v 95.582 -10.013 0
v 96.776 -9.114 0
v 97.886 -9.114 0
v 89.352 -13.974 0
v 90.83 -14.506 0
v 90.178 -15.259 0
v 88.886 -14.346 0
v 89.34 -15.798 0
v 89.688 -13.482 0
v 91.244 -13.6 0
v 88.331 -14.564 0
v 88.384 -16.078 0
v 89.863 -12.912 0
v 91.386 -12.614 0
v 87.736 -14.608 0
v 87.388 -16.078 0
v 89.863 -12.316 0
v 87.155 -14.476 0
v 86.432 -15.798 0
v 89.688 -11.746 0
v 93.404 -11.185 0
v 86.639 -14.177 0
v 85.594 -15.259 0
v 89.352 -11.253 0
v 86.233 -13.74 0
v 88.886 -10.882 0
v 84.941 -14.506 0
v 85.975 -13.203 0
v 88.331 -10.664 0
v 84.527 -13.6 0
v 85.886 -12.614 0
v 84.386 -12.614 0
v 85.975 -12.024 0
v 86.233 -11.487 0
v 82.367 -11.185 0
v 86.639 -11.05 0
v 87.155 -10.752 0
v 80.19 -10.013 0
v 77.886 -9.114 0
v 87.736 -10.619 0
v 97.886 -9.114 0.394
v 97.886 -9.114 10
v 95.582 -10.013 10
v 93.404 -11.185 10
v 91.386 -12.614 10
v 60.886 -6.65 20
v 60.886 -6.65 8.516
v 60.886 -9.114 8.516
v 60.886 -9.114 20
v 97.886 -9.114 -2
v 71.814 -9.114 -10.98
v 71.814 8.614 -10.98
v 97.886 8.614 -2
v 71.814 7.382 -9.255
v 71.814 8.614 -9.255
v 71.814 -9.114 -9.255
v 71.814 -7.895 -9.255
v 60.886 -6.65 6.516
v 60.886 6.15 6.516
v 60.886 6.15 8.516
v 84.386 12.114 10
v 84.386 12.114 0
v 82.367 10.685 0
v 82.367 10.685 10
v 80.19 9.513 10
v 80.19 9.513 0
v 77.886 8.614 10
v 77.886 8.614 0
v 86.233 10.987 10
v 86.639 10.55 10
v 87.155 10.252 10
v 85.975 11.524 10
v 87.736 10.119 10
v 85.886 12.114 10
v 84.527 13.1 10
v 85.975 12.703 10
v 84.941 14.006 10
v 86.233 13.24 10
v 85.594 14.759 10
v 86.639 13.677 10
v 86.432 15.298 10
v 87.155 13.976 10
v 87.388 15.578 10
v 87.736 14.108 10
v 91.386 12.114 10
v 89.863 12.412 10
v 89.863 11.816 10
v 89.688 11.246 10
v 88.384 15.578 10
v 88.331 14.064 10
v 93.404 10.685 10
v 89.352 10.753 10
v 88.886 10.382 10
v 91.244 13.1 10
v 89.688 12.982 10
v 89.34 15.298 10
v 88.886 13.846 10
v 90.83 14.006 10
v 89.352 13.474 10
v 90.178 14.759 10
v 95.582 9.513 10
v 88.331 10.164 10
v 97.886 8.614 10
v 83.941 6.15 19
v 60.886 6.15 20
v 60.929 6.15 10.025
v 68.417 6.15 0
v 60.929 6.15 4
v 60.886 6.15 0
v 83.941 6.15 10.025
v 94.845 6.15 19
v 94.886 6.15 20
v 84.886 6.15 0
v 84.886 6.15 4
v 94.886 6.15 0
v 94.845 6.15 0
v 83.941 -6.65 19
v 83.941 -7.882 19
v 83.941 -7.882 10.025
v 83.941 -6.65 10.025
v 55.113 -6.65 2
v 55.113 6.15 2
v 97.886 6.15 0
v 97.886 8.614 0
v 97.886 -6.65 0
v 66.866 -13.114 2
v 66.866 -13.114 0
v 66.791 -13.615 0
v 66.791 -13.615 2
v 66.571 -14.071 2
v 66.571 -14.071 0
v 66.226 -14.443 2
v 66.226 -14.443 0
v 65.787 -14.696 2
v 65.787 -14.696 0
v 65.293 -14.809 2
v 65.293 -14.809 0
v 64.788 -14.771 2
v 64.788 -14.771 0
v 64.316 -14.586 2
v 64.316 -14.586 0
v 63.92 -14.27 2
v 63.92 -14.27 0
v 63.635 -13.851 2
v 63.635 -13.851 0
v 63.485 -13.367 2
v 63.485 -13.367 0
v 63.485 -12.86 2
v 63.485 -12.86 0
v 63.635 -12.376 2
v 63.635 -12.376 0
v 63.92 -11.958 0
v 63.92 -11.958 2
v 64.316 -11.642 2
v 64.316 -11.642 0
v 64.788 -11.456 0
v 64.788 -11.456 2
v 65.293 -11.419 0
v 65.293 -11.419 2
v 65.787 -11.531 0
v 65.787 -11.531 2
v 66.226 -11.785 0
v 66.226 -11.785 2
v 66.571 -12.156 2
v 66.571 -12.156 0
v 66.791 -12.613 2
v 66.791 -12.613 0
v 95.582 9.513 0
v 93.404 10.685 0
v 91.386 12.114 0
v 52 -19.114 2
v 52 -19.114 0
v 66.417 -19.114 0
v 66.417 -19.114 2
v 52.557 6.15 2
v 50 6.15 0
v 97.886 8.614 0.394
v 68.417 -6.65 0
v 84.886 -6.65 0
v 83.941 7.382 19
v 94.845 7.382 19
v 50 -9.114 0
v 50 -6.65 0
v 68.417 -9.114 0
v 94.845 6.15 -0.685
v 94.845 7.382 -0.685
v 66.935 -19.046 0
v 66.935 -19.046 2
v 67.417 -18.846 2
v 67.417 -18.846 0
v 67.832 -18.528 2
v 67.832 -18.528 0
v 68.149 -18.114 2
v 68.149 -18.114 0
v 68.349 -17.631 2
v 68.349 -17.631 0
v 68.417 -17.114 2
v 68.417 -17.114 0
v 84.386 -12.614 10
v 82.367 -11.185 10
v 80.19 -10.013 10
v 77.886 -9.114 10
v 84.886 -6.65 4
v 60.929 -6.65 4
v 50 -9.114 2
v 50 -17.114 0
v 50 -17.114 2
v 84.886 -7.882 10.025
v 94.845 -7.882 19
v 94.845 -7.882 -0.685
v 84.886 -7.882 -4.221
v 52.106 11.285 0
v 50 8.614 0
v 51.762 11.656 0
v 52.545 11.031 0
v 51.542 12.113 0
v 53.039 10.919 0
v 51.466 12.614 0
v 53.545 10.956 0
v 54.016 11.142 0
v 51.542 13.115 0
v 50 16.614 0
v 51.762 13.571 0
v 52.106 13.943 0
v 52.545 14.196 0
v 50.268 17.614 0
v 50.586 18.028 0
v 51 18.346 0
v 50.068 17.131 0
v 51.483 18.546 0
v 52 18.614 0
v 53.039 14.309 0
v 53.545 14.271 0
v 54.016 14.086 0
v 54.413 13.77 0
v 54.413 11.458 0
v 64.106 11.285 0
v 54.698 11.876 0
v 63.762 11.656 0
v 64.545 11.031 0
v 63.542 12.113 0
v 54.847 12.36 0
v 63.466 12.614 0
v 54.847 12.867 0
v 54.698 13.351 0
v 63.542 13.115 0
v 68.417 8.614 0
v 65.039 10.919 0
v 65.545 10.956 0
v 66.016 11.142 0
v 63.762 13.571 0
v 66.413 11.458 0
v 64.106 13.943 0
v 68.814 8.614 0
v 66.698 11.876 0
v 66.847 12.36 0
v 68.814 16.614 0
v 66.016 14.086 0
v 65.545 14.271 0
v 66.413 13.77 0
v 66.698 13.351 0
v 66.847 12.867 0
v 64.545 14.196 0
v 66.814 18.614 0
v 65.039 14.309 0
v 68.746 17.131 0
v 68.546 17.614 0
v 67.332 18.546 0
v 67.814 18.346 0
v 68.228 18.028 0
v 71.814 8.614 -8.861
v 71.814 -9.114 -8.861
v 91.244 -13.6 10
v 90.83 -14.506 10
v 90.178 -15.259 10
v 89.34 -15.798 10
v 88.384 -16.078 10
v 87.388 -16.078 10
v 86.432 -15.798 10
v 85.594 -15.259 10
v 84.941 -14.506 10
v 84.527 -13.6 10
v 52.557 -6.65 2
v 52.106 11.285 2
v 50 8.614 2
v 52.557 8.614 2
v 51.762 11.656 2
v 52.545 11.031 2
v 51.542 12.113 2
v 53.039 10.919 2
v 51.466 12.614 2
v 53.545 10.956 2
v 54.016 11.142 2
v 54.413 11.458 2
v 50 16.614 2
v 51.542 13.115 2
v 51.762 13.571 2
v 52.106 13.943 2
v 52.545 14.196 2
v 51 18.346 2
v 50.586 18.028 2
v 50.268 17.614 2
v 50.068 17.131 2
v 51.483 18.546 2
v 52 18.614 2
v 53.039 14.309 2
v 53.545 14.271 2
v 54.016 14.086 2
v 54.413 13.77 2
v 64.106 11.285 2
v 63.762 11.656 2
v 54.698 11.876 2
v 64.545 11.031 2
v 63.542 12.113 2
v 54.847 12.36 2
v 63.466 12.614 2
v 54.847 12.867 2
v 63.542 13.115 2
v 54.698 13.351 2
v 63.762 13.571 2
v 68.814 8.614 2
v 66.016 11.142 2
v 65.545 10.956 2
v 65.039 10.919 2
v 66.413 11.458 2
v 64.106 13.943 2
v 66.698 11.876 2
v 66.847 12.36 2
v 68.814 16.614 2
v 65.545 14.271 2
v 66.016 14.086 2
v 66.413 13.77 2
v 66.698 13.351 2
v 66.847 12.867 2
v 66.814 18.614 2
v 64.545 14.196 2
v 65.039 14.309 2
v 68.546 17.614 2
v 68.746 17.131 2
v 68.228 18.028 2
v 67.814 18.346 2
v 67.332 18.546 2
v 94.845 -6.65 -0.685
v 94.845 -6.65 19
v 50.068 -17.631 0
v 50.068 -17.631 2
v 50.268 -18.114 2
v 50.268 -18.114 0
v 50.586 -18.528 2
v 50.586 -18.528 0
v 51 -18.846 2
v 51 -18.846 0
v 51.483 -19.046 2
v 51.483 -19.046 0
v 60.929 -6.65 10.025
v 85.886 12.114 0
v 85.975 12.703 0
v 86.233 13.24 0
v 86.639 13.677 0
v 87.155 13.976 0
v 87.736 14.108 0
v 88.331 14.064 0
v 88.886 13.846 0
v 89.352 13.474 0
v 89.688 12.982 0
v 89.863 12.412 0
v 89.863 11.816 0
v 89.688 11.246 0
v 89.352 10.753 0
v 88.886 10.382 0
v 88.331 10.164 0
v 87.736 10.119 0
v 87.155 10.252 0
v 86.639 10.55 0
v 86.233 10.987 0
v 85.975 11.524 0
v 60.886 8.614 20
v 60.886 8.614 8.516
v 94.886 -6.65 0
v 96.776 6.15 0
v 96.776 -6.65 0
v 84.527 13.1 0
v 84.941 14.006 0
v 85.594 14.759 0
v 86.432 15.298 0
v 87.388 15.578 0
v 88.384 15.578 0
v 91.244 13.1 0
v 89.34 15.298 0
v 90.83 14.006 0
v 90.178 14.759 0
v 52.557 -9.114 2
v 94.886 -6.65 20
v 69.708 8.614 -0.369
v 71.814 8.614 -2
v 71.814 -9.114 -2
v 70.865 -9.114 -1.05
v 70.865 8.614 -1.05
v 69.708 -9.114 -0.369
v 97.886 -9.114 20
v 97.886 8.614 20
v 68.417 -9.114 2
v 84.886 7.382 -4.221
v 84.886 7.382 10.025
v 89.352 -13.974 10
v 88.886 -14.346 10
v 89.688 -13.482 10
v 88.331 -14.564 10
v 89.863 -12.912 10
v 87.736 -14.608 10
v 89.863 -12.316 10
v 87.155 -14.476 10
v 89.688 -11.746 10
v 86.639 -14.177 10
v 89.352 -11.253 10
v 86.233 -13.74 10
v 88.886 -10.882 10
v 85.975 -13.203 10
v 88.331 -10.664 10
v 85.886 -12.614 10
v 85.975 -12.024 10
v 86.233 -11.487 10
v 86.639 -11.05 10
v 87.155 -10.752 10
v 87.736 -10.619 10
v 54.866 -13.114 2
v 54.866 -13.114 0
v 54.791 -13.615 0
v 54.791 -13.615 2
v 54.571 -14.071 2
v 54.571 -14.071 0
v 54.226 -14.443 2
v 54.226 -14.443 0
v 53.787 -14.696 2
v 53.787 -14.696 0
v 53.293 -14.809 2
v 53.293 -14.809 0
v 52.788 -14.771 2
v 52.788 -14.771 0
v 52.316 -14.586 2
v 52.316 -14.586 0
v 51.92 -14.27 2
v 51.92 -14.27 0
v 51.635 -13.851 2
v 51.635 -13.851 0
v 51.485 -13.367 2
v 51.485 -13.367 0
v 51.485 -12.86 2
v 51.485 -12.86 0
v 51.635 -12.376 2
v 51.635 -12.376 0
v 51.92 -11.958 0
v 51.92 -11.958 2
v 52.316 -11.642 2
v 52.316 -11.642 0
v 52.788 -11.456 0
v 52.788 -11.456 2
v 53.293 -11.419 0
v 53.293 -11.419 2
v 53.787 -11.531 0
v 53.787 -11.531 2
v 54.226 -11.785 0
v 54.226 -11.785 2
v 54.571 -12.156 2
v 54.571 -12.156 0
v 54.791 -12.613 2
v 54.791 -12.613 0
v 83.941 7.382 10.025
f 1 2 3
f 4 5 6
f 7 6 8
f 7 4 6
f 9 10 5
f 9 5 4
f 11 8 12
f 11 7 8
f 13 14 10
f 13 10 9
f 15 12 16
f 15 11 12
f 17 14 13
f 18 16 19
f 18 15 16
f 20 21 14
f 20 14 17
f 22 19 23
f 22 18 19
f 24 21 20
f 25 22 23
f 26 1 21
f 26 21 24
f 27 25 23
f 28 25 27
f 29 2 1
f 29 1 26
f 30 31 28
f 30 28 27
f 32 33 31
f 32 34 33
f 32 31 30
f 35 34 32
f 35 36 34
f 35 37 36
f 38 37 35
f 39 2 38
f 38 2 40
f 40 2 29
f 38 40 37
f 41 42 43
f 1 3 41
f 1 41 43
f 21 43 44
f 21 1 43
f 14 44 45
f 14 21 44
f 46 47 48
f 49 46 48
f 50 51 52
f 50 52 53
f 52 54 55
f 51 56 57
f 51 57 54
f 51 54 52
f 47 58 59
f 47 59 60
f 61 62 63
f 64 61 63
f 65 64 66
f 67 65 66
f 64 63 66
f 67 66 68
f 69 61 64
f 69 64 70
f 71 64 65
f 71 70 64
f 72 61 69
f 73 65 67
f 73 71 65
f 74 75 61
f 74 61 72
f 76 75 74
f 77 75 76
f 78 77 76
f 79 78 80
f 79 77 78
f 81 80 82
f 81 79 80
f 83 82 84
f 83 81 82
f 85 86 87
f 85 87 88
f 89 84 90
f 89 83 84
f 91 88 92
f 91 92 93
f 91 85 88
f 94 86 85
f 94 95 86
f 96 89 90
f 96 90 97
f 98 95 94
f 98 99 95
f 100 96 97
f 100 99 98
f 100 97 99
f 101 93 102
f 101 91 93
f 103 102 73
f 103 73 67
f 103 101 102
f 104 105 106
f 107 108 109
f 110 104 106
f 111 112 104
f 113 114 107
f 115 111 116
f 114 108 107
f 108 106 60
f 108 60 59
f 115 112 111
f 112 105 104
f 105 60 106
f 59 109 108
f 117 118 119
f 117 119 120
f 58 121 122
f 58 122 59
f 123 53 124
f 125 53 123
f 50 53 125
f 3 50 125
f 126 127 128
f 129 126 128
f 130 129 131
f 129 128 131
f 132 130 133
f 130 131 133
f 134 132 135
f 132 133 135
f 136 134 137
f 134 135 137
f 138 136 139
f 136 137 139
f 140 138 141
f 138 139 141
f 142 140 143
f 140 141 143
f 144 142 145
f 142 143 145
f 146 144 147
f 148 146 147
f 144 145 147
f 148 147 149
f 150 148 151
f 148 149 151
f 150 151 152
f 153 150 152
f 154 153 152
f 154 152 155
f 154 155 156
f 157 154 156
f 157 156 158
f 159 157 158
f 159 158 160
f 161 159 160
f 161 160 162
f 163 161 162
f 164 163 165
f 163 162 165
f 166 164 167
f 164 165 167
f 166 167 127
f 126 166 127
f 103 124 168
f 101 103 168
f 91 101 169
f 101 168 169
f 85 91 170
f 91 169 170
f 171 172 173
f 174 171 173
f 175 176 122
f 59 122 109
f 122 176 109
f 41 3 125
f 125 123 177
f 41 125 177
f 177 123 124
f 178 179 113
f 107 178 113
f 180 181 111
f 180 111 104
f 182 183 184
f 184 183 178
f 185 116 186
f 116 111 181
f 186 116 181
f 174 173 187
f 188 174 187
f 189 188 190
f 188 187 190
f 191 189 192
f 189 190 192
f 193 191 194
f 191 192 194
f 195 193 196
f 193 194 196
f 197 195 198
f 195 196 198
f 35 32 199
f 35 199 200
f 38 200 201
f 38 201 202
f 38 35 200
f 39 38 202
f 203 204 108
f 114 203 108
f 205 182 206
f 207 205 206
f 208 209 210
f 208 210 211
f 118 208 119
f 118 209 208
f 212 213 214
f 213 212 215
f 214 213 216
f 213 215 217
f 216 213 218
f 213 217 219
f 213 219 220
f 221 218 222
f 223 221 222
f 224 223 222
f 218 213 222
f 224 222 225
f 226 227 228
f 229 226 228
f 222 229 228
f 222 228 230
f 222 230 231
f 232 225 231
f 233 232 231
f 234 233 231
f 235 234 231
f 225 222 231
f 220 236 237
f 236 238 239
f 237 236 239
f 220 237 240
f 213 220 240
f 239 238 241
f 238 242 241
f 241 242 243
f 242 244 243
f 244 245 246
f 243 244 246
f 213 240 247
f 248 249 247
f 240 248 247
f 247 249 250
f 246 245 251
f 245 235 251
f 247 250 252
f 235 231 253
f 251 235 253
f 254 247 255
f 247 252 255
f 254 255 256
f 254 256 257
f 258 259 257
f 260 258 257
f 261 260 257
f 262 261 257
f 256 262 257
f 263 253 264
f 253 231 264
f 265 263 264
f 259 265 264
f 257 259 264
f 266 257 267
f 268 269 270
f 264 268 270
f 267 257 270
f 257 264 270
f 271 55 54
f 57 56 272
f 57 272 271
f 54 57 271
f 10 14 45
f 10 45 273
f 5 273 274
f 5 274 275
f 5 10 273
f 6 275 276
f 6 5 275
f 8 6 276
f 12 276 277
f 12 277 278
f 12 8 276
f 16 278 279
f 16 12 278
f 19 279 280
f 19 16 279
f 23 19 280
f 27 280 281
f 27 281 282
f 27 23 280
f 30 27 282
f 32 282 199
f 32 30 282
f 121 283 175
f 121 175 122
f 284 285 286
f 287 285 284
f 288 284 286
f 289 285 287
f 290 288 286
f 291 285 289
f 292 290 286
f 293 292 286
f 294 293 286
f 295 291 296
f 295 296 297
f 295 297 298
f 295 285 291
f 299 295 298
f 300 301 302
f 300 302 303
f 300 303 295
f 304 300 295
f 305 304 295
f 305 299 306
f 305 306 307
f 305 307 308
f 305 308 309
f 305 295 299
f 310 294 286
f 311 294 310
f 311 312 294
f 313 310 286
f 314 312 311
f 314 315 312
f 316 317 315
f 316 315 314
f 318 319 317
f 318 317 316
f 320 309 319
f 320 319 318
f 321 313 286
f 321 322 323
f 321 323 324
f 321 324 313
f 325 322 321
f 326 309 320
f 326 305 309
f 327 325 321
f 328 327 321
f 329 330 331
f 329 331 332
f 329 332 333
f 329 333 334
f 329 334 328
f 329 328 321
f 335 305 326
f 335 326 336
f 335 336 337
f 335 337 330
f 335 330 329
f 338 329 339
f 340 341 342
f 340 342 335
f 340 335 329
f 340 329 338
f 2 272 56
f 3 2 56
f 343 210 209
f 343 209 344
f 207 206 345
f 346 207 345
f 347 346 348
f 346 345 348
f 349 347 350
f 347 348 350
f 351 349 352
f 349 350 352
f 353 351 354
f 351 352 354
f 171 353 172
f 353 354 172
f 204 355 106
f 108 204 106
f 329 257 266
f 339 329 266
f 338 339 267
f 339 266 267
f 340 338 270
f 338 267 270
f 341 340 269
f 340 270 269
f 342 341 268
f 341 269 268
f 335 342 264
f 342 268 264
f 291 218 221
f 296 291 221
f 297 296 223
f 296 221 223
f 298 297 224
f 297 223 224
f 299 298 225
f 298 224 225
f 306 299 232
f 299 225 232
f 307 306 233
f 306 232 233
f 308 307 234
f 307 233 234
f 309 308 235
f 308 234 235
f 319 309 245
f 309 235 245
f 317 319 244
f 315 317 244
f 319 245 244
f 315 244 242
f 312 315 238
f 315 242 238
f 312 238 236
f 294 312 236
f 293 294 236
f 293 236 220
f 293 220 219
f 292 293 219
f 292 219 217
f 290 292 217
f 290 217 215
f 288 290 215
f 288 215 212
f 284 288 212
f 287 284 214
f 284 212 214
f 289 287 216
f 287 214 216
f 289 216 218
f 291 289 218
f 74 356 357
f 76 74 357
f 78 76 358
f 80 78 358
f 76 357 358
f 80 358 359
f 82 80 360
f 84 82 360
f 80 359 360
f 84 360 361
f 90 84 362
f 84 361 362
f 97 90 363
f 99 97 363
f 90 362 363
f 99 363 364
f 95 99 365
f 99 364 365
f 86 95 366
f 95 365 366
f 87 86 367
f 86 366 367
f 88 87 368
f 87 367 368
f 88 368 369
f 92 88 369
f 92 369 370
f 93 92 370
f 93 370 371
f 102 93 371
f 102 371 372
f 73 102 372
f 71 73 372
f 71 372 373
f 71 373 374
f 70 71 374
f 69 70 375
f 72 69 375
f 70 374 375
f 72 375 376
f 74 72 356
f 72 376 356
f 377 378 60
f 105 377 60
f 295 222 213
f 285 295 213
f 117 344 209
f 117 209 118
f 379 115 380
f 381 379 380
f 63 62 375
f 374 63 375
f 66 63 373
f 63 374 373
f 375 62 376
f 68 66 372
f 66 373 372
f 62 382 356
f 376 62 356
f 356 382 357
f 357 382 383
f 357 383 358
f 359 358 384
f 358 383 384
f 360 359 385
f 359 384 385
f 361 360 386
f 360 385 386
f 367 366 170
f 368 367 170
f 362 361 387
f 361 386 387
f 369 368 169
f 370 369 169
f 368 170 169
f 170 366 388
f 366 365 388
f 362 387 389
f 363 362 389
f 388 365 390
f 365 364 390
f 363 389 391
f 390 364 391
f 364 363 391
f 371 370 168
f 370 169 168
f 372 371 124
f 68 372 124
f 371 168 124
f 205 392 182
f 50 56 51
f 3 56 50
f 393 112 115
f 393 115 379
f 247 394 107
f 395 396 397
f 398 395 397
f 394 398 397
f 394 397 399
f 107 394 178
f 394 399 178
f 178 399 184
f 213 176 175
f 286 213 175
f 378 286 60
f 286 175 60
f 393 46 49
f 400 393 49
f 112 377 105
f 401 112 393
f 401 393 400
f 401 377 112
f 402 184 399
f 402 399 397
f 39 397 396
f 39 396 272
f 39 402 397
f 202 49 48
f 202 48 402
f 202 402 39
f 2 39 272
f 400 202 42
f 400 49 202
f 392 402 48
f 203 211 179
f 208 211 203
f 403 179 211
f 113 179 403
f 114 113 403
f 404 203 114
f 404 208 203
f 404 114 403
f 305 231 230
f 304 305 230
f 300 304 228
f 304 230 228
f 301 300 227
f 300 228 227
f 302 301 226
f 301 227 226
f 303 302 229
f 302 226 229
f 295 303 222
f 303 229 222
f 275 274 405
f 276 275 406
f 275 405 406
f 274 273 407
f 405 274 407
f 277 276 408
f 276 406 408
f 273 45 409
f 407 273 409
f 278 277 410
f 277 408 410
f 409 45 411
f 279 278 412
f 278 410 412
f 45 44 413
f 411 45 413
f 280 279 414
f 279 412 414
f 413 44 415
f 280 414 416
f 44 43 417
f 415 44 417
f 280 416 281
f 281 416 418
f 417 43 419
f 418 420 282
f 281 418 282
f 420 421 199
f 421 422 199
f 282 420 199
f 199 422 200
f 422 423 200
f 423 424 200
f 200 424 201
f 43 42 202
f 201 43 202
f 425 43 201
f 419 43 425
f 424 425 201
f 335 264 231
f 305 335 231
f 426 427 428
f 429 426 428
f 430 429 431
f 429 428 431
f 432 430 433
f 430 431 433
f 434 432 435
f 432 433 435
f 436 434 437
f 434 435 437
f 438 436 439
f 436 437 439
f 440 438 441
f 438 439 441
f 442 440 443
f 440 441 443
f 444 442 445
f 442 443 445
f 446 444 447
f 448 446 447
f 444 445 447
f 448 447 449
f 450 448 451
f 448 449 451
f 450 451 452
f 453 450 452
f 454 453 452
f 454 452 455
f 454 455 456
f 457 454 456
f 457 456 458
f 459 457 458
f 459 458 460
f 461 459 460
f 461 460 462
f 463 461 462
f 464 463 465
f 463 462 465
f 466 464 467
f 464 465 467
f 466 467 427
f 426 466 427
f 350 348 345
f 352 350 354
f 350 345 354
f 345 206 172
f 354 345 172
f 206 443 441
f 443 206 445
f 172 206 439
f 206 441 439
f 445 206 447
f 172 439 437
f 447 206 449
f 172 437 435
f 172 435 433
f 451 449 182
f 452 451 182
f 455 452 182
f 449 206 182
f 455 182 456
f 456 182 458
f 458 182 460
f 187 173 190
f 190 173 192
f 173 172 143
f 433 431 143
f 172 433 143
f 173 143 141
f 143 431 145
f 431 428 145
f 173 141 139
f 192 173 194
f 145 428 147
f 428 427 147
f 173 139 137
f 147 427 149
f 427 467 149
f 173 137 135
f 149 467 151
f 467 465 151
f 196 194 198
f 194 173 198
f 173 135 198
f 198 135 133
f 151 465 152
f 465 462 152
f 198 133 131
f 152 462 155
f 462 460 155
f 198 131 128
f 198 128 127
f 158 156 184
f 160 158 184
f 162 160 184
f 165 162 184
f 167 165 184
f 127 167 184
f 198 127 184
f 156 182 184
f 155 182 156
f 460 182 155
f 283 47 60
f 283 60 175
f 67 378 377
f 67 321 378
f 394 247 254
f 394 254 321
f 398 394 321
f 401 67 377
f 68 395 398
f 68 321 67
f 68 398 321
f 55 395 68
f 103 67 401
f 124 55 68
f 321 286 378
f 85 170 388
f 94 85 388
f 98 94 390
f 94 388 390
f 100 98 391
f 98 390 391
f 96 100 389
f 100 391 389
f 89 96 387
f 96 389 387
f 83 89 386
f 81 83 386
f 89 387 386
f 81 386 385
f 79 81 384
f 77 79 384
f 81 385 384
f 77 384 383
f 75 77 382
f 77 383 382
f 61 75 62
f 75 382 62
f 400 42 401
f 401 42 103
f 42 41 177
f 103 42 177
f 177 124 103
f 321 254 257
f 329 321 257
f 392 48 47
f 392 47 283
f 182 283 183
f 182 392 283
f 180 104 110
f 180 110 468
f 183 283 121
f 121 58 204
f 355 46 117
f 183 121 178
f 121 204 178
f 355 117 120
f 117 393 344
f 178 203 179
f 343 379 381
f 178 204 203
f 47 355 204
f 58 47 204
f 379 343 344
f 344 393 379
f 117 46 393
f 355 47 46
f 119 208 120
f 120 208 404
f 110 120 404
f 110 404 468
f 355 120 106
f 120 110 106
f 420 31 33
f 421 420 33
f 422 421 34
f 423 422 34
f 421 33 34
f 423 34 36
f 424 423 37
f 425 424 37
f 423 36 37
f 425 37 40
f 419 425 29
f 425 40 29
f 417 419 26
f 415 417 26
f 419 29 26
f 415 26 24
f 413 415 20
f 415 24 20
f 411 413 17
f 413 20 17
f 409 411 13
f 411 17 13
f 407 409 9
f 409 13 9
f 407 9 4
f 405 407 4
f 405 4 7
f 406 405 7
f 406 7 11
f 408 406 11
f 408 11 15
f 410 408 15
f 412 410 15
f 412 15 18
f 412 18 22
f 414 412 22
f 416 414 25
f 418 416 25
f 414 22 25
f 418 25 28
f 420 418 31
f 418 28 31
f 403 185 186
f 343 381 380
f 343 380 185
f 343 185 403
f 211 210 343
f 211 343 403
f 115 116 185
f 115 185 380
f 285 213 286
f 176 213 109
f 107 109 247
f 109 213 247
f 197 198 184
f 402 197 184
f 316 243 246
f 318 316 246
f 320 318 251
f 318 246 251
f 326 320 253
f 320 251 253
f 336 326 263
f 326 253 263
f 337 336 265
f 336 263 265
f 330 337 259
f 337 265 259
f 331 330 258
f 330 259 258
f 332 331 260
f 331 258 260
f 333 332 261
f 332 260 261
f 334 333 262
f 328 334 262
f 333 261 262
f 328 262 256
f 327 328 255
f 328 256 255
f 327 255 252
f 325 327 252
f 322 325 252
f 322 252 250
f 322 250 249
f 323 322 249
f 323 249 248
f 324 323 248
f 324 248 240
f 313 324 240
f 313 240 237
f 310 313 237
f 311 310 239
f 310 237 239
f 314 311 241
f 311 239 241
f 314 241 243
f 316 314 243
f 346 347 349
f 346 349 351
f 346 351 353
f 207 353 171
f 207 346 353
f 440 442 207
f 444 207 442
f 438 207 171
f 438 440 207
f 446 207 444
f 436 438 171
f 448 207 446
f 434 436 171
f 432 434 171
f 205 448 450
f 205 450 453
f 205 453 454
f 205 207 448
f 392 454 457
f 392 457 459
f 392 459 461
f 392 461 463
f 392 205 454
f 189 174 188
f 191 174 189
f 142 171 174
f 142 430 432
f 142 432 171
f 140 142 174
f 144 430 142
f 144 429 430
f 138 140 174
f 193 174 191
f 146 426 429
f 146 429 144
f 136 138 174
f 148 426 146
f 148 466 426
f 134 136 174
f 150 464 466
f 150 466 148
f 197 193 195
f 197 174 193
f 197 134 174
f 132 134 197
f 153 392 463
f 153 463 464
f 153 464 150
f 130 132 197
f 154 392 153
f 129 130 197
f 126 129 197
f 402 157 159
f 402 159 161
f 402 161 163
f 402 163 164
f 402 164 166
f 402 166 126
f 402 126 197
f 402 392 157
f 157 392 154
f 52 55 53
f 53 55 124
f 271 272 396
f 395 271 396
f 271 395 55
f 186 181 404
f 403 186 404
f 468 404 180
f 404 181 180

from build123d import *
from build123d.topology import SkipClean

# Parameters (mm, degrees)
SALIENTE_EXTRUIR2_DEPTH      = 20
SALIENTE_EXTRUIR3_START      = -2.463797
SALIENTE_EXTRUIR3_DEPTH      = 2.463797
SALIENTE_EXTRUIR4_DEPTH      = 2.463797195
CROQUIS4_R                   = 2
CROQUIS4_R_2                 = 3.5
SALIENTE_EXTRUIR5_DEPTH      = 10
CORTAR_EXTRUIR1_DEPTH        = 10
CORTAR_EXTRUIR1_DEPTH_BACK   = 19
CROQUIS5_W                   = 10.904508264
CROQUIS5_H                   = 15.264086628
SALIENTE_EXTRUIR6_DEPTH      = 9.255106
SALIENTE_EXTRUIR6_DEPTH_BACK = 10.025
CROQUIS7_W                   = 23.956346688
CROQUIS7_H                   = 15.277003438
CORTAR_EXTRUIR2_DEPTH        = 103.636657602
CROQUIS9_W                   = 4
CROQUIS9_H                   = 12.8
CORTAR_EXTRUIR3_DEPTH        = 44.32026299
SALIENTE_EXTRUIR14_DEPTH     = 17.727594
CROQUIS11_R                  = 1.7
SALIENTE_EXTRUIR15_DEPTH     = 2
SALIENTE_EXTRUIR16_DEPTH     = 12.8


with BuildPart() as part:
    # Croquis1 → Saliente-Extruir2 (new body)
    with BuildSketch(Plane.XY):
        Polygon((60.885724234, -9.113797195), (97.885724234, -9.113797195), (97.885724234, 8.613797195), (60.885724234, 8.613797195), (60.885724234, 6.15), (94.885724234, 6.15), (94.885724234, -6.65), (60.885724234, -6.65), align=None)
    extrude(amount=SALIENTE_EXTRUIR2_DEPTH)

    # Croquis2 → Saliente-Extruir3 (add)
    with SkipClean():  # the faces are left unmerged after this step: merging them gives an invalid solid
        with BuildSketch(Plane(origin=(0, 8.613797195, 0), x_dir=(1, 0, 0), z_dir=(0, 1, 0)).offset(SALIENTE_EXTRUIR3_START)):
            with BuildLine():
                ThreePointArc((71.814275766, 2), (70.308416296, 0.672909982), (68.417392018, 0))
                Line((68.417392018, 0), (97.885724234, 0))
                Line((97.885724234, 0), (71.814275766, 9.255105503))
                Line((71.814275766, 9.255105503), (71.814275766, 2))
            make_face()
            Polygon((50.000330077, 0), (60.885724234, -8.516201314), (60.885724234, 0), align=None)
        extrude(amount=SALIENTE_EXTRUIR3_DEPTH)

    # Croquis3 → Saliente-Extruir4 (add)
    with SkipClean():  # the faces are left unmerged after this step: merging them gives an invalid solid
        with BuildSketch(Plane.XZ.offset(9.113797195)):
            Polygon((60.885724234, 0), (60.885724234, 8.516201314), (50.000330077, 0), align=None)
            with BuildLine():
                Line((94.885724234, 0), (68.417392018, 0))
                ThreePointArc((68.417392018, 0), (70.308416296, -0.672909982), (71.814275766, -2))
                Line((71.814275766, -2), (71.814275766, -9.255105503))
                Line((71.814275766, -9.255105503), (97.885724234, 0))
                Line((97.885724234, 0), (94.885724234, 0))
            make_face()
        extrude(amount=-SALIENTE_EXTRUIR4_DEPTH)

    # Croquis4 → Saliente-Extruir5 (add)
    # profile 1 of 4: a face of its own
    with SkipClean():  # the faces are left unmerged after this step: merging them gives an invalid solid
        with BuildSketch(Plane(origin=(0, 0, 0), x_dir=(-1, 0, 0), z_dir=(0, 0, -1))):
            with BuildLine():
                ThreePointArc((-84.385724234, 12.113797195), (-81.296227313, 10.065720048), (-77.885724234, 8.613797195))
                Line((-77.885724234, 8.613797195), (-97.885724234, 8.613797195))
                ThreePointArc((-97.885724234, 8.613797195), (-94.475221154, 10.065720048), (-91.385724234, 12.113797195))
                ThreePointArc((-91.385724234, 12.113797195), (-87.885724234, 15.613797195), (-84.385724234, 12.113797195))
            make_face()
            with Locations((-87.885724234, 12.113797195)):
                Circle(CROQUIS4_R, mode=Mode.SUBTRACT)
        # profile 2 of 4: a face of its own
        with BuildSketch(Plane(origin=(0, 0, 0), x_dir=(-1, 0, 0), z_dir=(0, 0, -1))):
            with BuildLine():
                ThreePointArc((-91.385724234, -12.613797195), (-90.360597982, -10.138923475), (-87.885724275, -9.113797195))
                Line((-87.885724275, -9.113797195), (-97.885724234, -9.113797195))
                ThreePointArc((-97.885724234, -9.113797195), (-94.475221154, -10.565720048), (-91.385724234, -12.613797195))
            make_face()
        # profile 3 of 4: a face of its own
        with BuildSketch(Plane(origin=(0, 0, 0), x_dir=(-1, 0, 0), z_dir=(0, 0, -1))):
            with BuildLine():
                ThreePointArc((-84.385724234, -12.613797195), (-81.296227313, -10.565720048), (-77.885724234, -9.113797195))
                Line((-77.885724234, -9.113797195), (-87.885724275, -9.113797195))
                ThreePointArc((-87.885724275, -9.113797195), (-85.410850514, -10.138923446), (-84.385724234, -12.613797195))
            make_face()
        # profile 4 of 4: a face of its own
        with BuildSketch(Plane(origin=(0, 0, 0), x_dir=(-1, 0, 0), z_dir=(0, 0, -1))):
            with Locations((-87.885724234, -12.613797195)):
                Circle(CROQUIS4_R_2)
            with Locations((-87.885724234, -12.613797195)):
                Circle(CROQUIS4_R, mode=Mode.SUBTRACT)
        extrude(amount=-SALIENTE_EXTRUIR5_DEPTH)

    # Croquis5 → Cortar-Extruir1 (cut, two sides: drawn at the far end of the back side and taken through both)
    with SkipClean():  # the faces are left unmerged after this step: merging them gives an invalid solid
        with BuildSketch(Plane(origin=(0, 0, 0), x_dir=(-1, 0, 0), z_dir=(0, 0, -1)).offset(-CORTAR_EXTRUIR1_DEPTH_BACK)):
            with Locations((-89.39295043, -0.250144717)):
                Rectangle(CROQUIS5_W, CROQUIS5_H)
        extrude(amount=CORTAR_EXTRUIR1_DEPTH + CORTAR_EXTRUIR1_DEPTH_BACK, mode=Mode.SUBTRACT)

    # Croquis7 → Saliente-Extruir6 (add, two sides: drawn at the far end of the back side and taken through both)
    with SkipClean():  # the faces are left unmerged after this step: merging them gives an invalid solid
        with BuildSketch(Plane(origin=(0, 0, 0), x_dir=(-1, 0, 0), z_dir=(0, 0, -1)).offset(-SALIENTE_EXTRUIR6_DEPTH_BACK)):
            with Locations((-72.90755089, -0.256603122)):
                Rectangle(CROQUIS7_W, CROQUIS7_H)
        extrude(amount=SALIENTE_EXTRUIR6_DEPTH + SALIENTE_EXTRUIR6_DEPTH_BACK)

    # Croquis8 → Cortar-Extruir2 (cut, through all)
    with SkipClean():  # the faces are left unmerged after this step: merging them gives an invalid solid
        with BuildSketch(Plane.XZ.offset(7.895104841)):
            with BuildLine():
                ThreePointArc((71.814275766, -2), (70.308416296, -0.672909982), (68.417392018, 0))
                Line((68.417392018, 0), (60.929377546, 0))
                Line((60.929377546, 0), (60.929377546, -9.255105503))
                Line((60.929377546, -9.255105503), (71.814275766, -9.255105503))
                Line((71.814275766, -9.255105503), (71.814275766, -2))
            make_face()
            Polygon((84.885724234, -4.614871003), (71.814275766, -9.255105503), (84.885724234, -9.255105503), align=None)
        extrude(amount=-CORTAR_EXTRUIR2_DEPTH, mode=Mode.SUBTRACT)


with BuildPart() as cortar_extruir2_kept_piece:
    # of the separate pieces the step leaves, the one the design keeps (cortar_extruir2_pieces_kept)
    add(part.part.solids().sort_by_distance((60.885724234, -9.113797195, 0))[0])

    # Croquis9 → Cortar-Extruir3 (cut, through all)
    with BuildSketch(Plane(origin=(84.885724234, 0, 0), x_dir=(0, 0, -1), z_dir=(1, 0, 0))):
        with Locations((-2, -0.25)):
            Rectangle(CROQUIS9_W, CROQUIS9_H)
    extrude(amount=-CORTAR_EXTRUIR3_DEPTH, mode=Mode.SUBTRACT)

    # Croquis10 → Saliente-Extruir14 (add)
    with SkipClean():  # the faces are left unmerged after this step: merging them gives an invalid solid
        with BuildSketch(Plane.XZ.offset(9.113797195)):
            Polygon((71.814275766, -9.255105503), (71.814275766, -10.980236396), (97.885724234, -2), (97.885724234, 0), (97.885724234, 0.393932893), (71.814275766, -8.86117261), align=None)
        extrude(amount=-SALIENTE_EXTRUIR14_DEPTH)

    # Croquis11 → Saliente-Extruir15 (add)
    # profile 1 of 2: a face of its own
    with SkipClean():  # the faces are left unmerged after this step: merging them gives an invalid solid
        with BuildSketch(Plane(origin=(0, 0, 0), x_dir=(-1, 0, 0), z_dir=(0, 0, -1))):
            with BuildLine():
                Line((-68.417392018, -9.113797195), (-50.000330077, -9.113797195))
                Line((-50.000330077, -9.113797195), (-50.000330077, -17.113797195))
                ThreePointArc((-50.000330077, -17.113797195), (-50.586116515, -18.528010757), (-52.000330077, -19.113797195))
                Line((-52.000330077, -19.113797195), (-66.417392018, -19.113797195))
                ThreePointArc((-66.417392018, -19.113797195), (-67.831605581, -18.528010757), (-68.417392018, -17.113797195))
                Line((-68.417392018, -17.113797195), (-68.417392018, -9.113797195))
            make_face()
            with Locations(Location((-65.166367035, -13.113797195, 0), (0, 0, 180))):
                Circle(CROQUIS11_R, mode=Mode.SUBTRACT)
            with Locations(Location((-53.166367035, -13.113797195, 0), (0, 0, 180))):
                Circle(CROQUIS11_R, mode=Mode.SUBTRACT)
        # profile 2 of 2: a face of its own
        with BuildSketch(Plane(origin=(0, 0, 0), x_dir=(-1, 0, 0), z_dir=(0, 0, -1))):
            with BuildLine():
                Line((-50.000330077, 8.613797195), (-68.814275766, 8.613797195))
                Line((-68.814275766, 8.613797195), (-68.814275766, 16.613797195))
                ThreePointArc((-68.814275766, 16.613797195), (-68.228489329, 18.028010757), (-66.814275766, 18.613797195))
                Line((-66.814275766, 18.613797195), (-52.000330077, 18.613797195))
                ThreePointArc((-52.000330077, 18.613797195), (-50.586116515, 18.028010757), (-50.000330077, 16.613797195))
                Line((-50.000330077, 16.613797195), (-50.000330077, 8.613797195))
            make_face()
            with Locations((-53.166367035, 12.613797195)):
                Circle(CROQUIS11_R, mode=Mode.SUBTRACT)
            with Locations((-65.166367035, 12.613797195)):
                Circle(CROQUIS11_R, mode=Mode.SUBTRACT)
        extrude(amount=-SALIENTE_EXTRUIR15_DEPTH)

    # Croquis12 → Saliente-Extruir16 (add)
    with SkipClean():  # the faces are left unmerged after this step: merging them gives an invalid solid
        with BuildSketch(Plane(origin=(0, -6.65, 0), x_dir=(1, 0, 0), z_dir=(0, 1, 0))):
            Polygon((60.885724234, -8.516201314), (52.556726704, -2), (55.113123331, -2), (60.885724234, -6.516201314), align=None)
        extrude(amount=SALIENTE_EXTRUIR16_DEPTH)


solid = cortar_extruir2_kept_piece.part
